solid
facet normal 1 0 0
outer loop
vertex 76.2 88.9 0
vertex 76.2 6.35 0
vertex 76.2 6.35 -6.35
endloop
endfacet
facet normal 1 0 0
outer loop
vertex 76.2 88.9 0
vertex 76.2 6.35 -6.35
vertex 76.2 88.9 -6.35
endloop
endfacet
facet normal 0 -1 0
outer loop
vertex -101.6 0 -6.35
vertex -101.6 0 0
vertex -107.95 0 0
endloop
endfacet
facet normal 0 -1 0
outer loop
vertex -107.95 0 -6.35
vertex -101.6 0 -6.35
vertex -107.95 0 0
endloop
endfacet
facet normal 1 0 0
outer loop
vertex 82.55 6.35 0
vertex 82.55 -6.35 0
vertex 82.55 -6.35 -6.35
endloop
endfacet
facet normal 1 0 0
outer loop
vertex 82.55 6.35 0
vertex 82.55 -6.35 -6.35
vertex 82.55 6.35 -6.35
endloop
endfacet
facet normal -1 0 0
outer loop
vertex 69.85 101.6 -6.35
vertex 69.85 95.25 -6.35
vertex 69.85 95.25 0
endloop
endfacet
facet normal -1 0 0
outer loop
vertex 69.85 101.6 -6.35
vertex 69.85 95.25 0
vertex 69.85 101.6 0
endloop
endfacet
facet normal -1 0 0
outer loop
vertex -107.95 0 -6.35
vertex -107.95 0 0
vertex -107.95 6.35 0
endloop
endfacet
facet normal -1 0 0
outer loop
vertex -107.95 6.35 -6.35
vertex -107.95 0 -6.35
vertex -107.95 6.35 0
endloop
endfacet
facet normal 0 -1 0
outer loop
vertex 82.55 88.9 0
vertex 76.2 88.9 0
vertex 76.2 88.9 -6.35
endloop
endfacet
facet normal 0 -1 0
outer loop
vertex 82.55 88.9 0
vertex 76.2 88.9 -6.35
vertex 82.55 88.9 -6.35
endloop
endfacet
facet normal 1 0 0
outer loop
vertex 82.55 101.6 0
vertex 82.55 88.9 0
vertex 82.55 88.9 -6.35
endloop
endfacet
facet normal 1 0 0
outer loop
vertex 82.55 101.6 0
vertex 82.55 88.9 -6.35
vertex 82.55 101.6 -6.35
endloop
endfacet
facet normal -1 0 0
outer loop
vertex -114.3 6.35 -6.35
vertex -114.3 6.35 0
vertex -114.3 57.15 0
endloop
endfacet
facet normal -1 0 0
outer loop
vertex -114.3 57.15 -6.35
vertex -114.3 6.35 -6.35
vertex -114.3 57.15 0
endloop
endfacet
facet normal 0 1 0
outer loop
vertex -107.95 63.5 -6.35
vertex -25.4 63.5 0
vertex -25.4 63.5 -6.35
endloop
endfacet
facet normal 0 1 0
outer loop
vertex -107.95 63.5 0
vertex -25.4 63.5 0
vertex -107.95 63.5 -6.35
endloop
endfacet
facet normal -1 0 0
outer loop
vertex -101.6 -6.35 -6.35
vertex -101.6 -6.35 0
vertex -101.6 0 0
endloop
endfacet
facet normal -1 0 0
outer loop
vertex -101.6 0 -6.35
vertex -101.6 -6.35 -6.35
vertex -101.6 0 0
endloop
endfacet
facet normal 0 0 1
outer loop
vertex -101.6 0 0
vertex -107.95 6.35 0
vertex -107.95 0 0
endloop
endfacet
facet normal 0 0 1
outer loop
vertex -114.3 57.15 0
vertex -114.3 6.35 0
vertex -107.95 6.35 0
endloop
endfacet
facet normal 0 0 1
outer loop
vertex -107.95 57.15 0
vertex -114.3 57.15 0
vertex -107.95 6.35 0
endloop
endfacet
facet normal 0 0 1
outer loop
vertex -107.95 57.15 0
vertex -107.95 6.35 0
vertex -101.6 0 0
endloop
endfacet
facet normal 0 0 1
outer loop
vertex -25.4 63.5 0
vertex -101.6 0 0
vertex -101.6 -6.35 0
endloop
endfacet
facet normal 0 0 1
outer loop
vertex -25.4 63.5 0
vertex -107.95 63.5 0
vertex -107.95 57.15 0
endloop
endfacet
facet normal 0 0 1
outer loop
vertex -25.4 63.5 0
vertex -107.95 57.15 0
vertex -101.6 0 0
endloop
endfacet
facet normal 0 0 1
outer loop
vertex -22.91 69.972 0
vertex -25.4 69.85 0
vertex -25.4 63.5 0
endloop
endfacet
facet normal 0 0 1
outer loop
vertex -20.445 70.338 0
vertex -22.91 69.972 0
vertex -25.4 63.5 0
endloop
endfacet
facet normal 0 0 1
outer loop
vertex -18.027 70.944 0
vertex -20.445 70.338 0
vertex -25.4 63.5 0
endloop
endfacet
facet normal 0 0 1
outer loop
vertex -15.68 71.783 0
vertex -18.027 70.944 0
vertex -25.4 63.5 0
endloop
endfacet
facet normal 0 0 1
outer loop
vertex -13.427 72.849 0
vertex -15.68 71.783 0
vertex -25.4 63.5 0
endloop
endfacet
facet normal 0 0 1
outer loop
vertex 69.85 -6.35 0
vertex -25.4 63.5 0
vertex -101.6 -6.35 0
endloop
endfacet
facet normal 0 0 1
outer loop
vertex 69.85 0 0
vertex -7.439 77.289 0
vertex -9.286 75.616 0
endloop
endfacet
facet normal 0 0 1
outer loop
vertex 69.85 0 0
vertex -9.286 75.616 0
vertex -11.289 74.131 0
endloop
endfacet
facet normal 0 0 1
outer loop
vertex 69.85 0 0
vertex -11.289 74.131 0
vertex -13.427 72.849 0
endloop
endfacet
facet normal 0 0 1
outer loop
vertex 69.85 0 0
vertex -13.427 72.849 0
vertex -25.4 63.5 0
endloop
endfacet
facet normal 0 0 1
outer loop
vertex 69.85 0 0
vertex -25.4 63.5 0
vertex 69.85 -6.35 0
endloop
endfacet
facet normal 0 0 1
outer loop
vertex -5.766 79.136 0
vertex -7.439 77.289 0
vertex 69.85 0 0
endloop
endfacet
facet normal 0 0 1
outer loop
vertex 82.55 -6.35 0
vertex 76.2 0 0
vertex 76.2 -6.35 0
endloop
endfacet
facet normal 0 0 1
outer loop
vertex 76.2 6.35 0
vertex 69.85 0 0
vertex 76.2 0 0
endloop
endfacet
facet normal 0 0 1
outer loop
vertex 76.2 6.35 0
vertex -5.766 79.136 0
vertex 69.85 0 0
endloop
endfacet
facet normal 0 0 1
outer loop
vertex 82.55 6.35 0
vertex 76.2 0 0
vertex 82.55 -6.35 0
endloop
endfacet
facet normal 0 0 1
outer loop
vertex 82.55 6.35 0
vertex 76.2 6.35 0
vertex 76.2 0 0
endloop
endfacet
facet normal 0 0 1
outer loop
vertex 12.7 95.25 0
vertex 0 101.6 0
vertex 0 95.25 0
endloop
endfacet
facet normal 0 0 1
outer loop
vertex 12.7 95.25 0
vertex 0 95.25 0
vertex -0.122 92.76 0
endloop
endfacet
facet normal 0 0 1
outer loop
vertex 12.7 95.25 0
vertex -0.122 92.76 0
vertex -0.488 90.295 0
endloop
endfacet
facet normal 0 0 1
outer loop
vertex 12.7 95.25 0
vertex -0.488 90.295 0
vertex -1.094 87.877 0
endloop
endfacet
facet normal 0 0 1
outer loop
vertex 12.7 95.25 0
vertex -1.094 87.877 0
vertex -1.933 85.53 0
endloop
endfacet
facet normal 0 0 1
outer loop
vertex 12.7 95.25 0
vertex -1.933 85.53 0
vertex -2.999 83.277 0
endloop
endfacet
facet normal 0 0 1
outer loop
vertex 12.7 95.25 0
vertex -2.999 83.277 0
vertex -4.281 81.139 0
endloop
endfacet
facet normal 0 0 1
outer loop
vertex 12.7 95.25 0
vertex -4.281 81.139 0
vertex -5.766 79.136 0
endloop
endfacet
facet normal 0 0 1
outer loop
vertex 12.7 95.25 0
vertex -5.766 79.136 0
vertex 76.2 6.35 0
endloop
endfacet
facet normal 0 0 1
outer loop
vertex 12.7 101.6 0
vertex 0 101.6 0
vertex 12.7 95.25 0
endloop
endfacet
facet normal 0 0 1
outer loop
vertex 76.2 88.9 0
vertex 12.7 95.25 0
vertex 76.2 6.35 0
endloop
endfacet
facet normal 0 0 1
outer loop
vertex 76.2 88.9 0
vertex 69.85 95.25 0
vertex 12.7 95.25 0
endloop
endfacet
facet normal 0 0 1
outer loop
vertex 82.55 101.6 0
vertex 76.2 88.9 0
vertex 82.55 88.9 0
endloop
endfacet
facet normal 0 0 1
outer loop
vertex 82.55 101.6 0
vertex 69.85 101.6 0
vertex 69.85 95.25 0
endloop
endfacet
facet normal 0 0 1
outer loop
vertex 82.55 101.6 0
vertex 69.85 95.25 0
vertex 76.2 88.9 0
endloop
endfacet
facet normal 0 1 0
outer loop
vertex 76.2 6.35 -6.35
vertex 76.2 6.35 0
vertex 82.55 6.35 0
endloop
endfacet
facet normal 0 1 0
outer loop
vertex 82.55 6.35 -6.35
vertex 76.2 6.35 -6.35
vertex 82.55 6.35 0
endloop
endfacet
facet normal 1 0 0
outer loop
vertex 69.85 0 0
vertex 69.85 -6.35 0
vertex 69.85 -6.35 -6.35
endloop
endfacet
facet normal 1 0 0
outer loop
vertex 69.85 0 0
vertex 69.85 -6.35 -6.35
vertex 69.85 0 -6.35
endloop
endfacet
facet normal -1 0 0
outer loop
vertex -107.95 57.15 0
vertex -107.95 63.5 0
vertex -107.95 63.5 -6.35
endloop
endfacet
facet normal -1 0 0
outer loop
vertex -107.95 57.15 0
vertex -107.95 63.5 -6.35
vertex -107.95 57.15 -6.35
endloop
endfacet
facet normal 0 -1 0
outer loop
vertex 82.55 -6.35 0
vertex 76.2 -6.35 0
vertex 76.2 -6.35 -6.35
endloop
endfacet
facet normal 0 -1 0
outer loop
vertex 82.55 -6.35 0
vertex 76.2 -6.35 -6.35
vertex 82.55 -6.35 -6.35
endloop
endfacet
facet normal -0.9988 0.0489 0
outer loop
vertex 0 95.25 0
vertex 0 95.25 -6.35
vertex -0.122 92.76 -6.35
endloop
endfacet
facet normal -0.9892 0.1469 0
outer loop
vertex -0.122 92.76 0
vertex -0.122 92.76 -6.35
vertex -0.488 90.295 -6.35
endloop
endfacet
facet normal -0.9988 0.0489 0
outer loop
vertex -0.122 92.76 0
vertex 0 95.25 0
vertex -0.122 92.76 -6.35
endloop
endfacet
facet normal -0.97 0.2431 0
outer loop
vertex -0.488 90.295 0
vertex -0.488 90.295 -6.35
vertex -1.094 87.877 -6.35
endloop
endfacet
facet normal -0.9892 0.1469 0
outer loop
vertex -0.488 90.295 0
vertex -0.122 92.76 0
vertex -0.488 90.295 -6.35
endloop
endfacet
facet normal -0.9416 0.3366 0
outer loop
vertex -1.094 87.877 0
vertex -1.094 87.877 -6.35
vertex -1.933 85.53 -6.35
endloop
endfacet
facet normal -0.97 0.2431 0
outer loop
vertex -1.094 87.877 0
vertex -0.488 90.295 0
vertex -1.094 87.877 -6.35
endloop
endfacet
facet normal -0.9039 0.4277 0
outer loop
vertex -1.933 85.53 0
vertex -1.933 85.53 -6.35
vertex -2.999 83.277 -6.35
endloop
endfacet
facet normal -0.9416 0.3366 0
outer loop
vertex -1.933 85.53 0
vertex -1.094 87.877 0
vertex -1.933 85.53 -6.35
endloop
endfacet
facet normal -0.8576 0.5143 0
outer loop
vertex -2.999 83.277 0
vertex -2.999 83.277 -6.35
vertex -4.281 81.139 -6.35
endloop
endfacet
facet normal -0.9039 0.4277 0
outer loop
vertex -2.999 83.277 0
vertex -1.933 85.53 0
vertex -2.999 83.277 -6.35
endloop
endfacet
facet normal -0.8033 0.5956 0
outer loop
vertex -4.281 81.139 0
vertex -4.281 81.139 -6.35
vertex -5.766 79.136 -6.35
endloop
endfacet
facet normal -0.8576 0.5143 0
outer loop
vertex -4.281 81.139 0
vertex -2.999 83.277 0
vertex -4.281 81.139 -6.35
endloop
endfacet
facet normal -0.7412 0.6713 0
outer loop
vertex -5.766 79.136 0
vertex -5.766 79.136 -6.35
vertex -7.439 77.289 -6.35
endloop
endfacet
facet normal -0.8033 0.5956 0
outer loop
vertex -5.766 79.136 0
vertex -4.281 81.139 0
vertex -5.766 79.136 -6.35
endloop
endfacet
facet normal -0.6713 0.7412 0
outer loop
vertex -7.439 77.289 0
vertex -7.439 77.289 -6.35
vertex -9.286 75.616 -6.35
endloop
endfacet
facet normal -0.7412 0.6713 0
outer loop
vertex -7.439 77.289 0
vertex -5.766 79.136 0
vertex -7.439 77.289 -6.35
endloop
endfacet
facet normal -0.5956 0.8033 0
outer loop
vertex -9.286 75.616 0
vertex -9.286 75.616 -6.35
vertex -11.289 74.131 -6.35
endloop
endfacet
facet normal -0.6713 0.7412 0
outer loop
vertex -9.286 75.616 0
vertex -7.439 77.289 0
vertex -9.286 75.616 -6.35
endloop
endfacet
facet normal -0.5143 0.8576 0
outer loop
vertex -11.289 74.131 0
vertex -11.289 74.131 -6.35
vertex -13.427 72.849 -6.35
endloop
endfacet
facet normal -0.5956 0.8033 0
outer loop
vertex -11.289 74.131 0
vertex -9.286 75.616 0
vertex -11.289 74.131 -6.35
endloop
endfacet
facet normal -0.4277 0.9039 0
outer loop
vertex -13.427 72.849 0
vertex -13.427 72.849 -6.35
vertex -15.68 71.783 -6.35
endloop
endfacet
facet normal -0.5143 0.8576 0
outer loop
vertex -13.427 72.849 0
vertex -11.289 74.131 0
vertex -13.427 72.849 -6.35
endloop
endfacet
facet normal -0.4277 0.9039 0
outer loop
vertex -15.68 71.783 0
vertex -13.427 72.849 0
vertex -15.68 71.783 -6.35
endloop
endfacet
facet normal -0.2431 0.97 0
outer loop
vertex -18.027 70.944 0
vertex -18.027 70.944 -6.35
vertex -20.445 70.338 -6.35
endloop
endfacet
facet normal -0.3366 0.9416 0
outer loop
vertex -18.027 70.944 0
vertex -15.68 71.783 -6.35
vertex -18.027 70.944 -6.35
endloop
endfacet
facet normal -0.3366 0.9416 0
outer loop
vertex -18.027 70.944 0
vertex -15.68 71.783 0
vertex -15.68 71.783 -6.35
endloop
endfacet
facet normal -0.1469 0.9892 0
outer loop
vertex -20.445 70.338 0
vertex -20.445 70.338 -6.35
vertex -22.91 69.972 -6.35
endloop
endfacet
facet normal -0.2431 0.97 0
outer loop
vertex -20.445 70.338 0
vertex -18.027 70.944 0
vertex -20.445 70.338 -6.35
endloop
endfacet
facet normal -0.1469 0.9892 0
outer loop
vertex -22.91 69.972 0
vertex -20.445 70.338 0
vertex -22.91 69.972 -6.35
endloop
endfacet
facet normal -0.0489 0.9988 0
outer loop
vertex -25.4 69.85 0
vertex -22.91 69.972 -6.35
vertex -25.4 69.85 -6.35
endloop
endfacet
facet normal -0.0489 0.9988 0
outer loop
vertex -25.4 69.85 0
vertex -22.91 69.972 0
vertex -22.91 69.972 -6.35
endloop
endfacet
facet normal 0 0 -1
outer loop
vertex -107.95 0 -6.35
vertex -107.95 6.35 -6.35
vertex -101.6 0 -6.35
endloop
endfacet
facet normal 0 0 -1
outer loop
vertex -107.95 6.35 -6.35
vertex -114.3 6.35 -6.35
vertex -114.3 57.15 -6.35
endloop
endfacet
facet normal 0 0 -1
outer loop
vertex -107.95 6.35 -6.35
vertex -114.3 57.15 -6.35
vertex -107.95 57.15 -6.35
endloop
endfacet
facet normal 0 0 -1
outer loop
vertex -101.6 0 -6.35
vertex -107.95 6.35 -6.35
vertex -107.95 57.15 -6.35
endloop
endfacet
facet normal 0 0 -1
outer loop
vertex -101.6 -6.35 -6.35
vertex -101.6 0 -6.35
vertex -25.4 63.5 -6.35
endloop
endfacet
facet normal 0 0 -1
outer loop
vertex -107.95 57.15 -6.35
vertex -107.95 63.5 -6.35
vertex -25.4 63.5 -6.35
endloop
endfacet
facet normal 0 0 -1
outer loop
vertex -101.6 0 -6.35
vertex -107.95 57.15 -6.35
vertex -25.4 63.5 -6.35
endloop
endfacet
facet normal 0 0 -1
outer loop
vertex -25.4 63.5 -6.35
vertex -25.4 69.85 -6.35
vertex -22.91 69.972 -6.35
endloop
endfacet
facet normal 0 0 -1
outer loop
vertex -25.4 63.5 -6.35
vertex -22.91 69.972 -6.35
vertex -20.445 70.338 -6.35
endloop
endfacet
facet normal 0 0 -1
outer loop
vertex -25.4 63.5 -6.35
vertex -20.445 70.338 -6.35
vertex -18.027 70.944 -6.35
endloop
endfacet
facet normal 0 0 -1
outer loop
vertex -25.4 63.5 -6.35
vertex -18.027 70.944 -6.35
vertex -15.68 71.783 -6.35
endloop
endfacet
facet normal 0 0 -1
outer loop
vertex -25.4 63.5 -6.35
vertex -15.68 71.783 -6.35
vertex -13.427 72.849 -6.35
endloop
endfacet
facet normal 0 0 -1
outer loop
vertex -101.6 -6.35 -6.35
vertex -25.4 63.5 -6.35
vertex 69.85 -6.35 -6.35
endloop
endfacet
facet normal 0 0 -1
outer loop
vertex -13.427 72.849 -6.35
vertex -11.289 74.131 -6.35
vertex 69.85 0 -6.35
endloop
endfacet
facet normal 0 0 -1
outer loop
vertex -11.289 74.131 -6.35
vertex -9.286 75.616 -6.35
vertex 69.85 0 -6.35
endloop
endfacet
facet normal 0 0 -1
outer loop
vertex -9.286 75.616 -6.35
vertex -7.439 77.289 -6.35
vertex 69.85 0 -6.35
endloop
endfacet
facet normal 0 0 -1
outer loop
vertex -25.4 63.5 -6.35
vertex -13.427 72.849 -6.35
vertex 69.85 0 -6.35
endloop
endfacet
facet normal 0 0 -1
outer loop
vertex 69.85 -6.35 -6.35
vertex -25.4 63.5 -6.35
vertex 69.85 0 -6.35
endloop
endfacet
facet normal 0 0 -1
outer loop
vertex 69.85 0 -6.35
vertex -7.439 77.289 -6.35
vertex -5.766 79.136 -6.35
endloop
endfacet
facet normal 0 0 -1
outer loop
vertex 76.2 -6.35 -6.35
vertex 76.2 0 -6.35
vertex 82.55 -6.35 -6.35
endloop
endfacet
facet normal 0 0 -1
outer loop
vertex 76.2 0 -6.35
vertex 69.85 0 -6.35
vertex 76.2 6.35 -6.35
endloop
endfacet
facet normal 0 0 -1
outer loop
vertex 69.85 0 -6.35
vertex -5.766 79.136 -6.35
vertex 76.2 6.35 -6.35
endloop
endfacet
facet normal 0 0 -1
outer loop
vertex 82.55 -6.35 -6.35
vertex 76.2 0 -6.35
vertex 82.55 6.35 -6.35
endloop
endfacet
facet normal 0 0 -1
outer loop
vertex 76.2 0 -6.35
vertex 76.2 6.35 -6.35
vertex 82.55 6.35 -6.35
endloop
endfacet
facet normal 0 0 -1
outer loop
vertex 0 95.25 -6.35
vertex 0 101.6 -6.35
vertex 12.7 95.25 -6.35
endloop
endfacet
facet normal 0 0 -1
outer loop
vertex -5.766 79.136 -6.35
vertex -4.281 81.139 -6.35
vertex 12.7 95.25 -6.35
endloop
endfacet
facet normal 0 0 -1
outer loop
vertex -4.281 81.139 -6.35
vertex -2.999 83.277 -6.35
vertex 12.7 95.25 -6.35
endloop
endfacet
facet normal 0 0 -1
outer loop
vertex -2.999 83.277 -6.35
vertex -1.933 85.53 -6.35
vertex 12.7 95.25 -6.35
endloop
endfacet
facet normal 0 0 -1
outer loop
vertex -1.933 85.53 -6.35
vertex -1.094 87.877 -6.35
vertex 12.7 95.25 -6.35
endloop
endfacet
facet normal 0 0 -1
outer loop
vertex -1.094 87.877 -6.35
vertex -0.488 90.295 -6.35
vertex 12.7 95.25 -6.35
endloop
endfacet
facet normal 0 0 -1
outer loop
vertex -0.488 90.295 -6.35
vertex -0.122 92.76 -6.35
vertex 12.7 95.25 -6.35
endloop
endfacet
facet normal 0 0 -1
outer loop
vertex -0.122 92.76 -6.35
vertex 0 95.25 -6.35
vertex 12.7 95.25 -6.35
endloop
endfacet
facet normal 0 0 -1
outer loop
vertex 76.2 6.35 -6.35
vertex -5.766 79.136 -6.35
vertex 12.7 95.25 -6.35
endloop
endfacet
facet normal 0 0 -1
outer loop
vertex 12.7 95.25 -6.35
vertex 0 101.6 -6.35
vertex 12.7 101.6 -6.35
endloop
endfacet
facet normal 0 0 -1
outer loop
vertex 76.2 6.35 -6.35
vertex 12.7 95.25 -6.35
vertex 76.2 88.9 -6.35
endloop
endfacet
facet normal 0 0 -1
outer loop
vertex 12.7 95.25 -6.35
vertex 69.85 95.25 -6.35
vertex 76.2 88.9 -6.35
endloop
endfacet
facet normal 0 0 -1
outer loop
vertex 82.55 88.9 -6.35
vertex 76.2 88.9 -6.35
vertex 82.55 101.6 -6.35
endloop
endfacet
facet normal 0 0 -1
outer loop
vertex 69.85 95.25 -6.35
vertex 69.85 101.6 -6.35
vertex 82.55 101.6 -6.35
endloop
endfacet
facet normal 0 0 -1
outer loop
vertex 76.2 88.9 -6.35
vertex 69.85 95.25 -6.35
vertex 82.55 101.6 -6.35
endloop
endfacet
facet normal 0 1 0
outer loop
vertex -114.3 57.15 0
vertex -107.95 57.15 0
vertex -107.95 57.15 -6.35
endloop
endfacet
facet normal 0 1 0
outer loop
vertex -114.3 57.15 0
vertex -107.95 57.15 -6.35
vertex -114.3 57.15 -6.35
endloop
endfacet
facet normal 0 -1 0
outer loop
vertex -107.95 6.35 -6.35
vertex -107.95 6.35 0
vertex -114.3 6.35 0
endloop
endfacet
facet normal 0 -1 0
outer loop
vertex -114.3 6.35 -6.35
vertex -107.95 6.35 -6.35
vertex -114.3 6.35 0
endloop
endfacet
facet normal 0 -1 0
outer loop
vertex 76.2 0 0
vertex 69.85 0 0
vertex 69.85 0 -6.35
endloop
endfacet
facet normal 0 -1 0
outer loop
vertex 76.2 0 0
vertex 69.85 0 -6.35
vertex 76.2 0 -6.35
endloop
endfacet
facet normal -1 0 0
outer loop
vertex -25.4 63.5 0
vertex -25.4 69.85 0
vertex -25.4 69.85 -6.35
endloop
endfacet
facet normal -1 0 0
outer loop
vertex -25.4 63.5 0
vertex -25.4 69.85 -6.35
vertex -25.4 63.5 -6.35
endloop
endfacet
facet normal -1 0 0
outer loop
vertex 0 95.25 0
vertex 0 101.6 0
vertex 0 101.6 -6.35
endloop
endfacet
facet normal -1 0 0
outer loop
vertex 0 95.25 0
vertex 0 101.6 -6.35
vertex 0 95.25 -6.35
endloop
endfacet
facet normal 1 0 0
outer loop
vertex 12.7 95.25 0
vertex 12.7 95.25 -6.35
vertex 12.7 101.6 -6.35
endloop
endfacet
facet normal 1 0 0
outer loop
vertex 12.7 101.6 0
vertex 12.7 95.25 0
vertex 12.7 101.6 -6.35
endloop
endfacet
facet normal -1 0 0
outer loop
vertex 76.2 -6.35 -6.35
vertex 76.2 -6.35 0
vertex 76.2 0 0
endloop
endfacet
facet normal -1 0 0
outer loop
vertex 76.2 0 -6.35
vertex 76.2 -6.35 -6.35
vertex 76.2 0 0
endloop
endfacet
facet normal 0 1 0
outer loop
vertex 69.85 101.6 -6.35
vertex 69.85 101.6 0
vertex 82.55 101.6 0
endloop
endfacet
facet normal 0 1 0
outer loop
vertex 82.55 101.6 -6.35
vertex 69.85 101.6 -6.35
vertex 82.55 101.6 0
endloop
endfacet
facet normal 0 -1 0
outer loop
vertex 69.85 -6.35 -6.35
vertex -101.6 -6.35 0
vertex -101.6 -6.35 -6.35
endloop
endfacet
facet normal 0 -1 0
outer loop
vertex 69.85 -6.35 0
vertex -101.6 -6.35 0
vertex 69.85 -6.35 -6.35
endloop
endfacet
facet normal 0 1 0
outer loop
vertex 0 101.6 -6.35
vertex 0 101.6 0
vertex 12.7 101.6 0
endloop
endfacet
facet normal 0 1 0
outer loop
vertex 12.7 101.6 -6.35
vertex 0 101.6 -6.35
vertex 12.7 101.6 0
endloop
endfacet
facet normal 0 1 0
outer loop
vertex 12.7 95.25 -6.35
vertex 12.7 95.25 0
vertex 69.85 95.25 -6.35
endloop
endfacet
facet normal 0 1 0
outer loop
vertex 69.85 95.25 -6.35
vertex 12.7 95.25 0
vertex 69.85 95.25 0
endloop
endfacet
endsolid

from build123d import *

# Parameters (mm, degrees)
SKETCH1_W           = 196.85
SKETCH1_H           = 107.95
BOSS_EXTRUDE1_DEPTH = 6.35
SKETCH2_W           = 57.15
SKETCH2_H           = 6.35
SKETCH2_W_2         = 6.35
SKETCH2_H_2         = 82.55
CUT_EXTRUDE1_DEPTH  = 154.060029074


with BuildPart() as part:
    # Sketch1 → Boss-Extrude1 (new body)
    with BuildSketch(Plane.XY):
        with Locations((-15.875, 47.625)):
            Rectangle(SKETCH1_W, SKETCH1_H)
    extrude(amount=-BOSS_EXTRUDE1_DEPTH)

    # Sketch2 → Cut-Extrude1 (cut, through all)
    with BuildSketch(Plane.XY):
        with BuildLine():
            Line((0, 101.6), (0, 95.25))
            ThreePointArc((0, 95.25), (-7.439487758, 77.289487758), (-25.4, 69.85))
            Line((-25.4, 69.85), (-25.4, 63.5))
            Line((-25.4, 63.5), (-107.95, 63.5))
            Line((-107.95, 63.5), (-107.95, 57.15))
            Line((-107.95, 57.15), (-114.3, 57.15))
            Line((-114.3, 57.15), (-114.3, 69.85))
            Line((-114.3, 69.85), (-114.3, 101.6))
            Line((-114.3, 101.6), (0, 101.6))
        make_face()
        with Locations((41.275, 98.425)):
            Rectangle(SKETCH2_W, SKETCH2_H)
        with Locations((79.375, 47.625)):
            Rectangle(SKETCH2_W_2, SKETCH2_H_2)
        Polygon((-114.3, -6.35), (-101.6, -6.35), (-101.6, 0), (-107.95, 0), (-107.95, 6.35), (-114.3, 6.35), align=None)
        with Locations((73.025, -3.175)):
            Rectangle(SKETCH2_W_2, SKETCH2_H)
    extrude(amount=-CUT_EXTRUDE1_DEPTH, mode=Mode.SUBTRACT)


solid = part.part
